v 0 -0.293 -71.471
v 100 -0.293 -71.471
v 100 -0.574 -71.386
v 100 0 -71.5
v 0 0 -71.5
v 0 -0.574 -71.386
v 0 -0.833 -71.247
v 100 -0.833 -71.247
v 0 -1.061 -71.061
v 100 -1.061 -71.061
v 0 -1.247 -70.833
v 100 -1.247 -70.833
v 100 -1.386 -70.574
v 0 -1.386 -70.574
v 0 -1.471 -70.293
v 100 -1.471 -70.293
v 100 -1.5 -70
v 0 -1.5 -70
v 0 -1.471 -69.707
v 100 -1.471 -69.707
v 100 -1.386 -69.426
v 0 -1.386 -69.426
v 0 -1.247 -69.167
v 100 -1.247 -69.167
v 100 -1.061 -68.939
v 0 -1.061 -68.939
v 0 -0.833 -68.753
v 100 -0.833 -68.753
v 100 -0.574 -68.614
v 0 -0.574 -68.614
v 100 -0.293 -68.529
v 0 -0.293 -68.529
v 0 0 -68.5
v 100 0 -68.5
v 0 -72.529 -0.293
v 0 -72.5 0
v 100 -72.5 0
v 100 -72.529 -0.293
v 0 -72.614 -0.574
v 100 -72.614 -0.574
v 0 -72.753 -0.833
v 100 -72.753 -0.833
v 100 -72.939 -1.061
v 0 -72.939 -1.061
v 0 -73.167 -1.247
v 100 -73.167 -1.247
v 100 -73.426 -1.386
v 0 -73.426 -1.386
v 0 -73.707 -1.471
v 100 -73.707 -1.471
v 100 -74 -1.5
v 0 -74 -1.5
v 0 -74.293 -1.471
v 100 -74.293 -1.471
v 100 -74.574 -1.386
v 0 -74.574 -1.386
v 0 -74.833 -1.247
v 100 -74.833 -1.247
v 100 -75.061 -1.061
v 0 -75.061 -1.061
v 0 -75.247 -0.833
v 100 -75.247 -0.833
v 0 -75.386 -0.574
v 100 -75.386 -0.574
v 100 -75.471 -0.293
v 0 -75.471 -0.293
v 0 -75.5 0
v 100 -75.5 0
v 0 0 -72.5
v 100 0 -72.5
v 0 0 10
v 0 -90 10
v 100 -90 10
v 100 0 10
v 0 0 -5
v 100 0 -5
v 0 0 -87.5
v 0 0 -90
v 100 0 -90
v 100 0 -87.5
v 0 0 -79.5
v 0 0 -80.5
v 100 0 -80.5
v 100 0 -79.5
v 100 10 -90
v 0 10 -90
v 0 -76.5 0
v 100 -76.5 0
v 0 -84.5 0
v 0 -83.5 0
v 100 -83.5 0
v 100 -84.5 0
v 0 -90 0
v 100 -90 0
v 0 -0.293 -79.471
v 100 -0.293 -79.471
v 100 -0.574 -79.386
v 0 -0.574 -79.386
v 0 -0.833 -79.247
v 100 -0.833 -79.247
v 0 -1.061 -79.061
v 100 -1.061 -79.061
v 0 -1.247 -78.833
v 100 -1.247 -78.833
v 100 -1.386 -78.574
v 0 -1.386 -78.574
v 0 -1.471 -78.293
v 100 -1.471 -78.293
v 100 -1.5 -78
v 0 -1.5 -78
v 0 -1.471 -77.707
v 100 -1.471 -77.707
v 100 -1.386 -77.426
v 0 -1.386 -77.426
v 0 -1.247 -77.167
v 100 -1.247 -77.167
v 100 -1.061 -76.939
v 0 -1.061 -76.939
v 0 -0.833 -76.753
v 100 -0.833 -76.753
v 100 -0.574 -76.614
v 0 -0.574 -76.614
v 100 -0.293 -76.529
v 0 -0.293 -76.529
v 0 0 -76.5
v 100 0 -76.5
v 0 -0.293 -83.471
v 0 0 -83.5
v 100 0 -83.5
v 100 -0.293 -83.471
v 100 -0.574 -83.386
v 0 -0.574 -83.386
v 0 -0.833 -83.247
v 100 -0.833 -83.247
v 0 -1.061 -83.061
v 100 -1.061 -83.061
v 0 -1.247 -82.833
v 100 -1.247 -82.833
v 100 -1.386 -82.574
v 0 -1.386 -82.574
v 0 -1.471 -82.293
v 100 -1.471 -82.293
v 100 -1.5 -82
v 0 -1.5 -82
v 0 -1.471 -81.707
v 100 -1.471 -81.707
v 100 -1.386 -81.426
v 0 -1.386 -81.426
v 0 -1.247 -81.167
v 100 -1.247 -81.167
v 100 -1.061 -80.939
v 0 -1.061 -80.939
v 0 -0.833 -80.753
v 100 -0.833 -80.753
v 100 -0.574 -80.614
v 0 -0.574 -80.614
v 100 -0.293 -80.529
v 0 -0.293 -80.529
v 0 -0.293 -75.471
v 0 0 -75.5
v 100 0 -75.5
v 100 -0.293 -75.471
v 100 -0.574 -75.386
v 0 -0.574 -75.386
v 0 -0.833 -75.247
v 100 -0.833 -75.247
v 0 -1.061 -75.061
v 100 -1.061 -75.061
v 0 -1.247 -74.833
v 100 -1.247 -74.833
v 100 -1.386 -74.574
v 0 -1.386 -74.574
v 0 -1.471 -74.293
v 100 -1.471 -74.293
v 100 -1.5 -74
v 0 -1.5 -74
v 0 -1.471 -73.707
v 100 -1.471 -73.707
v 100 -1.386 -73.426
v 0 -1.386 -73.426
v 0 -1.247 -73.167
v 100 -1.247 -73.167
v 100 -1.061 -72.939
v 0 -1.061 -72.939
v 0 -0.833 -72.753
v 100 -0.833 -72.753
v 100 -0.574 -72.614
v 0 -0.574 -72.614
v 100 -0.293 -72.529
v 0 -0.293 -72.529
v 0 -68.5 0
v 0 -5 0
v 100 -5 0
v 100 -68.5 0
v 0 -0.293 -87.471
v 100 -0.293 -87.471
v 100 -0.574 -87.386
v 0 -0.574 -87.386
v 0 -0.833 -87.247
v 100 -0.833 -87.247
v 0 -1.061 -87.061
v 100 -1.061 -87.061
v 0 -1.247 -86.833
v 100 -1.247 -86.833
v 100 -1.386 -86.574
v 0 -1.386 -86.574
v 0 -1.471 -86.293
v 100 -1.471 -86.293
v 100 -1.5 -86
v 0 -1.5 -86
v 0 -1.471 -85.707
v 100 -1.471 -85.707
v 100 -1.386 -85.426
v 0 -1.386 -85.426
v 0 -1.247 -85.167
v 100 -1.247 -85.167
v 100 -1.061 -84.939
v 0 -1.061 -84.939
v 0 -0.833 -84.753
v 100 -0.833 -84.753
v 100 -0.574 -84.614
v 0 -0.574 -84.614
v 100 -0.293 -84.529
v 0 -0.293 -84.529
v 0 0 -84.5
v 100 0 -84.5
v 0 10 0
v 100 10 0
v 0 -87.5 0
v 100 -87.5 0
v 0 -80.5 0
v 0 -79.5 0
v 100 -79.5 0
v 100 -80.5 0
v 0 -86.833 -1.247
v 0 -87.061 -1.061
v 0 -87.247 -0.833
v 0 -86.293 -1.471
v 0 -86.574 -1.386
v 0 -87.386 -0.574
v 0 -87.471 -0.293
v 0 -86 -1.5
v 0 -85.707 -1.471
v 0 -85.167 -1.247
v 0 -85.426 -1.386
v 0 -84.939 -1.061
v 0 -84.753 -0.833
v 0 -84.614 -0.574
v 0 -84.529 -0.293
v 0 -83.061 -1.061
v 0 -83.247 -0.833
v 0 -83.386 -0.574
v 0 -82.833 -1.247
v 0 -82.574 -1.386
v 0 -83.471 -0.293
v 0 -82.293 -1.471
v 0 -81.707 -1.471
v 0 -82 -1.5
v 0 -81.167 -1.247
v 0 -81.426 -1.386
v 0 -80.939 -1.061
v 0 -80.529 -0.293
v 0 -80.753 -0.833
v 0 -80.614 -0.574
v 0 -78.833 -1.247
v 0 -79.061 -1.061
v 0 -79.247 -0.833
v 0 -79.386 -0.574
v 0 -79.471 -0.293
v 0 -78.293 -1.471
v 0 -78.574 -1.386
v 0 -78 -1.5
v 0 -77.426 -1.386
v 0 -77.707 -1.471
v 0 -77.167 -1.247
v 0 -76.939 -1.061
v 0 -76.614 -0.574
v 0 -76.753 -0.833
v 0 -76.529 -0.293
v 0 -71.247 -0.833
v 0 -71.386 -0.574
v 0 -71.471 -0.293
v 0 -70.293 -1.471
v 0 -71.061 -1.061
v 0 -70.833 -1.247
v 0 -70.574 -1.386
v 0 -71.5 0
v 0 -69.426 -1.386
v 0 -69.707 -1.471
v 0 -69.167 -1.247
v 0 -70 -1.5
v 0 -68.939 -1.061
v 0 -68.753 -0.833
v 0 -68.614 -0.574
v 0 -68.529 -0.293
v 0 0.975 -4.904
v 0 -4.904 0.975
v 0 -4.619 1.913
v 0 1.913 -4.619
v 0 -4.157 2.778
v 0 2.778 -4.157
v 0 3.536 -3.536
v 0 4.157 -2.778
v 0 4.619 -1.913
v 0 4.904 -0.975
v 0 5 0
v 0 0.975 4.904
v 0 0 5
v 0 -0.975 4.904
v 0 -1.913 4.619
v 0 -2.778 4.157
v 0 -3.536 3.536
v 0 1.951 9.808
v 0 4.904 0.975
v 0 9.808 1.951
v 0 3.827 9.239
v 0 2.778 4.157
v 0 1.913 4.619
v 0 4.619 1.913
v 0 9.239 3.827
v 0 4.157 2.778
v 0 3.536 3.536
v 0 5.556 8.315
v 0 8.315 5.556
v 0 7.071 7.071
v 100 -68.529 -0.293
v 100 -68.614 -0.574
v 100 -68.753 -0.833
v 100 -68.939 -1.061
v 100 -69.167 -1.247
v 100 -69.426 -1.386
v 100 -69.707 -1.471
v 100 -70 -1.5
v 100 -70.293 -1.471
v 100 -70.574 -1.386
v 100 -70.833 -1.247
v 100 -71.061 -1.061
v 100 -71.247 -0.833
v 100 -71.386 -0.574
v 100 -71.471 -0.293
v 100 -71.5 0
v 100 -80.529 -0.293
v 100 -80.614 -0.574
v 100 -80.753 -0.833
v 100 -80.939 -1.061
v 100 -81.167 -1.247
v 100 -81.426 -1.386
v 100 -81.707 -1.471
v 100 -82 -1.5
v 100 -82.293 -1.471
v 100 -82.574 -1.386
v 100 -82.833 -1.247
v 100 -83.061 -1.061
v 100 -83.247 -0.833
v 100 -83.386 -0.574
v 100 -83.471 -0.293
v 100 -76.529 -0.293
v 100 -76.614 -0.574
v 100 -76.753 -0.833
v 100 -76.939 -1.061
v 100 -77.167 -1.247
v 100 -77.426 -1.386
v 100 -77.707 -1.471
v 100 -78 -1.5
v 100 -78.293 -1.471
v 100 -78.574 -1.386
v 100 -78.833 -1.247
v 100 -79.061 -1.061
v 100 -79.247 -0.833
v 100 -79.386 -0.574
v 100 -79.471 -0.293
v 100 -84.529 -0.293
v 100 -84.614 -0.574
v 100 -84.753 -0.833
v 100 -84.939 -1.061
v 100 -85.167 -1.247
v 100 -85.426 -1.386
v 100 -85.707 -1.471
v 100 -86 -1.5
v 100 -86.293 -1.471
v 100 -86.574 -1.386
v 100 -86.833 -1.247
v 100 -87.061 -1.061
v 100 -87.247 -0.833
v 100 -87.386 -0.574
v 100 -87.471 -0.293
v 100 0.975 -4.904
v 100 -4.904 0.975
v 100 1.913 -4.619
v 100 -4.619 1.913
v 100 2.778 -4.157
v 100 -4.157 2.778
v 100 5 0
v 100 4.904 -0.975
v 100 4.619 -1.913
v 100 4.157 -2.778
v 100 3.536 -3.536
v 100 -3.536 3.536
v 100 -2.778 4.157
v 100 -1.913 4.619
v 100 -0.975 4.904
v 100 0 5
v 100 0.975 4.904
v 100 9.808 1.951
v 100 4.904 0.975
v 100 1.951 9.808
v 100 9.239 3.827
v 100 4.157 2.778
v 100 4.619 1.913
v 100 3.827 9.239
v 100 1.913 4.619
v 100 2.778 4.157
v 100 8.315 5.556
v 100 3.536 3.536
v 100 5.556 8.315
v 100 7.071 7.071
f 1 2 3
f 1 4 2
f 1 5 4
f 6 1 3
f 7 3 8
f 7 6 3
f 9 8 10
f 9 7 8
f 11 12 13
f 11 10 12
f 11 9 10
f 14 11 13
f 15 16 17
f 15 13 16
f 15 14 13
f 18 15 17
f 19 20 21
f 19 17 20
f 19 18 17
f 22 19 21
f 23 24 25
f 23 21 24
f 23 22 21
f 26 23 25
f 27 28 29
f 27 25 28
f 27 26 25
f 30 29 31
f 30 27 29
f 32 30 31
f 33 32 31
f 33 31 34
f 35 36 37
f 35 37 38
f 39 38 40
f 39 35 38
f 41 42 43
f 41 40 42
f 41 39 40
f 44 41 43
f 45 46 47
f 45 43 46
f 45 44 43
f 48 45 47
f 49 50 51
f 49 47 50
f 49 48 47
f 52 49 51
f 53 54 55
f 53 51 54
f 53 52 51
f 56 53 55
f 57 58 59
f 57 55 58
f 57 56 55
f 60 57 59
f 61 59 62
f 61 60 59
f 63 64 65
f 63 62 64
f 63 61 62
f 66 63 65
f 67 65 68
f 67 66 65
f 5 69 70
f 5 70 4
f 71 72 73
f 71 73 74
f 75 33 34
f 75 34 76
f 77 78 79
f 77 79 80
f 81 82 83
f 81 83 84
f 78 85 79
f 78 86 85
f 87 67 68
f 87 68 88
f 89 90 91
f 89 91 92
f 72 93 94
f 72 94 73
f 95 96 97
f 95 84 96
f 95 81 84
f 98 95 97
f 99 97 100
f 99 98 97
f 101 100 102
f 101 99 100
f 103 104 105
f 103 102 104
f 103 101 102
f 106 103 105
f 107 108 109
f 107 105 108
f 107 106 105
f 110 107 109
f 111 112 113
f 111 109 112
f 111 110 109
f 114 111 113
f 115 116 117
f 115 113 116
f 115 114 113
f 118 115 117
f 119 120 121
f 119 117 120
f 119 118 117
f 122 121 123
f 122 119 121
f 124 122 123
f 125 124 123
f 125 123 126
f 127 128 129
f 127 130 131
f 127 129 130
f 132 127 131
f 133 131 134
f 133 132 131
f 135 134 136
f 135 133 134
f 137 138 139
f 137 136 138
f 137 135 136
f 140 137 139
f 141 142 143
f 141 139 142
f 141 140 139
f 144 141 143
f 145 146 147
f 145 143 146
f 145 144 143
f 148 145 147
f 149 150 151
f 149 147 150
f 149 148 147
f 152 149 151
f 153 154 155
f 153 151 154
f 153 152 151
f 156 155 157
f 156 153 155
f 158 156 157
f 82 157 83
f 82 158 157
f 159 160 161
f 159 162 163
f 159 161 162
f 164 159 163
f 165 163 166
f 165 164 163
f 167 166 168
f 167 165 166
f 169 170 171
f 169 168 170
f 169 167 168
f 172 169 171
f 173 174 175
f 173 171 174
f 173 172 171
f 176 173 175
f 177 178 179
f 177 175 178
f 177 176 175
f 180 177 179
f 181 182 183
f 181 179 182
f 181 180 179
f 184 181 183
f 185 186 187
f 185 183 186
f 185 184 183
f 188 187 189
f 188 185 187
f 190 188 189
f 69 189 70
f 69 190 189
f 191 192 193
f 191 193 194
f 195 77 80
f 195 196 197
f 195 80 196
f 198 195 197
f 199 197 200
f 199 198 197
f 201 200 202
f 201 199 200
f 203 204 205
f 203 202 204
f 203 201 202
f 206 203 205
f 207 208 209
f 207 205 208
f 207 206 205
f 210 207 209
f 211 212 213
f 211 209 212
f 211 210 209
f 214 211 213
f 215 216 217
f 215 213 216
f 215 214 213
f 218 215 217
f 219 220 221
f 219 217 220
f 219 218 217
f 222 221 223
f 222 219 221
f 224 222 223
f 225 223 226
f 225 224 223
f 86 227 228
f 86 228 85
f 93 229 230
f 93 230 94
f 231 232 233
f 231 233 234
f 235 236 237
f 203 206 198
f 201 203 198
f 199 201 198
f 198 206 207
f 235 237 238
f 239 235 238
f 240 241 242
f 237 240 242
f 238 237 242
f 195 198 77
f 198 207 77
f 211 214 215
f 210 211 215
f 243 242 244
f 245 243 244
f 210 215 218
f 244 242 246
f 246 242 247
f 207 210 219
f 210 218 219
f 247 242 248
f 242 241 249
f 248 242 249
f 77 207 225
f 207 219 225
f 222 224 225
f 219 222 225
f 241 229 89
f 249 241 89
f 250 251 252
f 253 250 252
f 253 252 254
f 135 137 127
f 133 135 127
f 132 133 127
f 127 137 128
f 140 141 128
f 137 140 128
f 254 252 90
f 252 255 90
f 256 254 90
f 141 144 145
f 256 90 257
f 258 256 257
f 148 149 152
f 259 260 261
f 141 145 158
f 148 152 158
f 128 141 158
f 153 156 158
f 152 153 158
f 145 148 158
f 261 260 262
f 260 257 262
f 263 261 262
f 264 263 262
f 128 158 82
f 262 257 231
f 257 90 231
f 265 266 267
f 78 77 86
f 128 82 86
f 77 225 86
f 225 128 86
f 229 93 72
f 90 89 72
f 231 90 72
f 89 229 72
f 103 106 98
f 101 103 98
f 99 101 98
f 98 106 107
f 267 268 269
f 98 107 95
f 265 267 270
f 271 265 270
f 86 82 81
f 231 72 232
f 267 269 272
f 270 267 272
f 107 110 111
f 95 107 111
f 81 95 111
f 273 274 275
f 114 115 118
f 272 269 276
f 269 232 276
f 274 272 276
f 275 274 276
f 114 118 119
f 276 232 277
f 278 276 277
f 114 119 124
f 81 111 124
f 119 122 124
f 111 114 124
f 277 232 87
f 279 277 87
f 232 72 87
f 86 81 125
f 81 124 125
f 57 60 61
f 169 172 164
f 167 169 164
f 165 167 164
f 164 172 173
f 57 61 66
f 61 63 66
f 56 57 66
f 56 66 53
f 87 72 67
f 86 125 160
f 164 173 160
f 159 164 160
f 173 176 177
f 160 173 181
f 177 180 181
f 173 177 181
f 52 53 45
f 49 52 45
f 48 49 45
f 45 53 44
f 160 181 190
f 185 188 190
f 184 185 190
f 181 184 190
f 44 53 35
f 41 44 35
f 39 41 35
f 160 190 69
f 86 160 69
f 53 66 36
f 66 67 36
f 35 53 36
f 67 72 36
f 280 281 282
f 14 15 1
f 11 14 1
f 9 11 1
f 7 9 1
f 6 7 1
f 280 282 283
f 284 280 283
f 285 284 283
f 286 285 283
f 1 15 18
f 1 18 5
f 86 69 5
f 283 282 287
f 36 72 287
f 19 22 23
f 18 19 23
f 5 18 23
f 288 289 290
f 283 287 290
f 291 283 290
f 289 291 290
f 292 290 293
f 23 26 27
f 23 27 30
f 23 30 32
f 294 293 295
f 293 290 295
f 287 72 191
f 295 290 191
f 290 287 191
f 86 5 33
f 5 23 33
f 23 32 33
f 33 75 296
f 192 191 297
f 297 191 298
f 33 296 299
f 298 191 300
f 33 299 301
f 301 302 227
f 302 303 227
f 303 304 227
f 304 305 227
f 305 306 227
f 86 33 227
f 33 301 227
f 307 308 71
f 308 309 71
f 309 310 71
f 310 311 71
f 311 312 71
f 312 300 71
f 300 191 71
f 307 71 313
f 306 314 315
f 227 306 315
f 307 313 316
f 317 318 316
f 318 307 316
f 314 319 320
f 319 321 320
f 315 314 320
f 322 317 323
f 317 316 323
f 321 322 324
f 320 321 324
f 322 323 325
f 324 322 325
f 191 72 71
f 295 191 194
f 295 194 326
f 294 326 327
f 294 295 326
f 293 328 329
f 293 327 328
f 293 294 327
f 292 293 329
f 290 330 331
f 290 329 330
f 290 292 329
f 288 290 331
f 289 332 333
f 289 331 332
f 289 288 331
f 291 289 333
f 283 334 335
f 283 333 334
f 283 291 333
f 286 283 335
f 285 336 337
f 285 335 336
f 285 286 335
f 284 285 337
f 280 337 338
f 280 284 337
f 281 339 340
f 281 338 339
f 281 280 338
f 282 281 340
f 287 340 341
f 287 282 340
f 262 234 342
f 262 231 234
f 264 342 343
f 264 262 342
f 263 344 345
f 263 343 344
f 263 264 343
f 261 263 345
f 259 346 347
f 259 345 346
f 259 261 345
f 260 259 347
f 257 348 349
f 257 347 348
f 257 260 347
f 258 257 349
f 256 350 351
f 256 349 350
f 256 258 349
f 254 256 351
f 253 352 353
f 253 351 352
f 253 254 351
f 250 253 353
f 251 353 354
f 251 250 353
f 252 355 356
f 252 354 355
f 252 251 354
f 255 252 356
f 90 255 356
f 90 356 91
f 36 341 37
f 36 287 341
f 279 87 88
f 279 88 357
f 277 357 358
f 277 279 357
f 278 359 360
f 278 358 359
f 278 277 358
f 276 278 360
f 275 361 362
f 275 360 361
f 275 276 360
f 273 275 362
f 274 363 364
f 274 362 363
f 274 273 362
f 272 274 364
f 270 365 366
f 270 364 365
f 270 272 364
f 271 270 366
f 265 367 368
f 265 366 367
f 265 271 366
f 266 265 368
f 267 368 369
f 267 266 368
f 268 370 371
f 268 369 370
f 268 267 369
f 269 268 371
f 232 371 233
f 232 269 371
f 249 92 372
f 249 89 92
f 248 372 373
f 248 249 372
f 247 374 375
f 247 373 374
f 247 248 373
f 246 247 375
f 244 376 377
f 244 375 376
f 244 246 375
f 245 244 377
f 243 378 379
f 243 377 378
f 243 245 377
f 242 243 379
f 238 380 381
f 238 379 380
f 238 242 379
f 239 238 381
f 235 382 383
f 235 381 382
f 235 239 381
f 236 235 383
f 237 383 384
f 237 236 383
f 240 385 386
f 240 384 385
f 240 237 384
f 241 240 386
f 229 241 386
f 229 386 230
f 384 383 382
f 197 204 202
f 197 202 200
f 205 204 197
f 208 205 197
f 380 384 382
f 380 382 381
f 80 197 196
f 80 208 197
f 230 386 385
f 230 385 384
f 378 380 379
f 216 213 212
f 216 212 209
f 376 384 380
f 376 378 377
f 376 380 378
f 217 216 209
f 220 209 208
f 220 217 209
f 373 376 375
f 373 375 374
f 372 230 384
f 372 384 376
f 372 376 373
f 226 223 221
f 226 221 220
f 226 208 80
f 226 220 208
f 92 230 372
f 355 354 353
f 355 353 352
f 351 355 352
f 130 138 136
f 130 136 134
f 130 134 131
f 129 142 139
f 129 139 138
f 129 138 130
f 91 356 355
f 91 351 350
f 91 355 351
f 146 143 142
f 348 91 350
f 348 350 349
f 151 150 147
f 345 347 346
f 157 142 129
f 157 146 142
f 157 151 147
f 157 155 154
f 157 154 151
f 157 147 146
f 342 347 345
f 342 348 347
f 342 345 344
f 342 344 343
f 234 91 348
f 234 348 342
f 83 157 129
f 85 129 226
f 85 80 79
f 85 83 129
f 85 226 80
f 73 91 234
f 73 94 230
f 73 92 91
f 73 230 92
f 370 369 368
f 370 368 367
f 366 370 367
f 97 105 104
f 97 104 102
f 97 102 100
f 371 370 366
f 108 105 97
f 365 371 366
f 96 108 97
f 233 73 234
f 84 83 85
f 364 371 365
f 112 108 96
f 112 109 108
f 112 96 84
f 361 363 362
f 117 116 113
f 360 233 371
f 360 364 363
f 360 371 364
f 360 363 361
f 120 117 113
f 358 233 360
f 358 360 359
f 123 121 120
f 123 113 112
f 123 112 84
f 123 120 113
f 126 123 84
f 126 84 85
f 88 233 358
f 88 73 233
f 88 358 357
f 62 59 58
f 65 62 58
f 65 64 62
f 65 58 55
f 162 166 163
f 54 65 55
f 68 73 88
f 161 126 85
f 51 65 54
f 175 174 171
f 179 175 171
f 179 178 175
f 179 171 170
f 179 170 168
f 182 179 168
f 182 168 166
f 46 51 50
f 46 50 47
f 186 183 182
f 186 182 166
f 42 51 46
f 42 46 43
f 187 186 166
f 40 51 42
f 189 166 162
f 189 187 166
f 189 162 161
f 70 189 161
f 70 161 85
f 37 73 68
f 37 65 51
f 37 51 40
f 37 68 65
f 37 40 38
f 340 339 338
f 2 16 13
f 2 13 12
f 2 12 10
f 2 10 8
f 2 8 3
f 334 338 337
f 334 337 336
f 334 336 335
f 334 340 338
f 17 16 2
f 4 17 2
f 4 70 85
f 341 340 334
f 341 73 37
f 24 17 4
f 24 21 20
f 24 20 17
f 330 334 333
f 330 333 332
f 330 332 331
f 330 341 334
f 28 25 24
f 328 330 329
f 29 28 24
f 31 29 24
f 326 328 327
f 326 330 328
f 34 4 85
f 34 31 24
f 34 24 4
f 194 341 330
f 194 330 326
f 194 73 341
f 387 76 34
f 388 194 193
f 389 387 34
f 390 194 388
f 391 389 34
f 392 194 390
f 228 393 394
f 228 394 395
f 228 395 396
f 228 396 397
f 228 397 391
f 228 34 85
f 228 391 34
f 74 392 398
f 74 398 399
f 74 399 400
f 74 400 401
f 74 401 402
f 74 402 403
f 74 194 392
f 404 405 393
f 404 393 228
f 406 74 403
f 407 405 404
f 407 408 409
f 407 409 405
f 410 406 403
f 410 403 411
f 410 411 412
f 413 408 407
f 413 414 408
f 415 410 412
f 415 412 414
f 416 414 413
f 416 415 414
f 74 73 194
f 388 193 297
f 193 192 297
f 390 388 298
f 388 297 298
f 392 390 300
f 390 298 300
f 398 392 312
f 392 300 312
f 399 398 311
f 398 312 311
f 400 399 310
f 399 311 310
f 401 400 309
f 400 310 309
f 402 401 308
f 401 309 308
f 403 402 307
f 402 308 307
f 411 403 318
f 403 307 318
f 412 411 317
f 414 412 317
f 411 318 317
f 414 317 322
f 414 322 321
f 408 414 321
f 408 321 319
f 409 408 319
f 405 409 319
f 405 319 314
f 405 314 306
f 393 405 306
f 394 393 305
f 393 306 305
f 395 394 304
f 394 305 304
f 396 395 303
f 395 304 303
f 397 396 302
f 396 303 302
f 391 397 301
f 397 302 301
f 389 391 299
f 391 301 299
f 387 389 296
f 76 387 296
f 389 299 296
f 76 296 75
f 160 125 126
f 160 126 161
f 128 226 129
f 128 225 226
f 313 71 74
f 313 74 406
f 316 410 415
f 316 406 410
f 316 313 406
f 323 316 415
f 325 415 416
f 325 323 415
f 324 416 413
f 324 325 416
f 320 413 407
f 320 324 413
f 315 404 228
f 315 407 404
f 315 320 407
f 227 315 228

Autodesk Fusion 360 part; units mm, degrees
sketch "Sketch1" plane through (0, 0, 0) normal (1, 0, 0) x (0, 1, 0)
  line L0 (0, 0) -> (-166.0515, 0)
  line L1 (-166.0515, 0) -> (-166.0515, -106.0261)
  line L2 (-166.0515, -106.0261) -> (0, -106.0261)
  line L3 (0, -106.0261) -> (0, 0)
  line L4 (-90, 0) -> (-90, 10)
  line L5 (-90, 10) -> (0, 10)
  line L6 (10, 0) -> (10, -90)
  line L7 (10, -90) -> (0, -90)
  circle A0 centre (0, 0) radius 5
  arc A1 (10, 0) -> (0, 10) centre (0, 0) ccw
  circle A2 centre (-70, 0) radius 1.5
  circle A3 centre (-74, 0) radius 1.5
  circle A4 centre (-78, 0) radius 1.5
  circle A5 centre (-82, 0) radius 1.5
  circle A6 centre (-86, 0) radius 1.5
  line L8 (-86, 0) -> (-82, 0)
  line L9 (-86, 0) -> (-90, 0)
  line L10 (-82, 0) -> (-78, 0)
  line L11 (-78, 0) -> (-74, 0)
  line L12 (-74, 0) -> (-70, 0)
  line L13 (0, 0) -> (7.0711, 7.0711)
  circle A7 centre (0, -86) radius 1.5
  circle A8 centre (0, -82) radius 1.5
  circle A9 centre (0, -78) radius 1.5
  circle A10 centre (0, -74) radius 1.5
  circle A11 centre (0, -70) radius 1.5
  point P0 (10, 10)
  point P1 (-65.366, 0)
  dimension "d1" = 10
  dimension "d2" = 100
  dimension "d5" = 10
  dimension "d6" = 10
  dimension "d7" = 3
  dimension "d8" = 4
extrude "Extrude1" add sketch "Sketch1" along normal blind 100 contours L0 A2 L12 | L0 L4 L5 A0 A1 A2 A3 A4 A5 A6 L8 L9 L10 L11 L12 L13 | L0 A2 L12 | L3 L6 L7 A0 A1 L13 A7 A8 A9 A10 A11 | L0 A3 L11 L12 | L0 A3 L11 L12 | L3 A11 | L3 A11 | L0 A4 L10 L11 | L0 A4 L10 L11 | L3 A10 | L3 A10 | L0 A5 L8 L10 | L0 A5 L8 L10 | L3 A7 | L3 A7 | L0 A6 L8 L9 | L0 A6 L8 L9 | L3 A9 | L3 A9 | L3 A8 | L3 A8
